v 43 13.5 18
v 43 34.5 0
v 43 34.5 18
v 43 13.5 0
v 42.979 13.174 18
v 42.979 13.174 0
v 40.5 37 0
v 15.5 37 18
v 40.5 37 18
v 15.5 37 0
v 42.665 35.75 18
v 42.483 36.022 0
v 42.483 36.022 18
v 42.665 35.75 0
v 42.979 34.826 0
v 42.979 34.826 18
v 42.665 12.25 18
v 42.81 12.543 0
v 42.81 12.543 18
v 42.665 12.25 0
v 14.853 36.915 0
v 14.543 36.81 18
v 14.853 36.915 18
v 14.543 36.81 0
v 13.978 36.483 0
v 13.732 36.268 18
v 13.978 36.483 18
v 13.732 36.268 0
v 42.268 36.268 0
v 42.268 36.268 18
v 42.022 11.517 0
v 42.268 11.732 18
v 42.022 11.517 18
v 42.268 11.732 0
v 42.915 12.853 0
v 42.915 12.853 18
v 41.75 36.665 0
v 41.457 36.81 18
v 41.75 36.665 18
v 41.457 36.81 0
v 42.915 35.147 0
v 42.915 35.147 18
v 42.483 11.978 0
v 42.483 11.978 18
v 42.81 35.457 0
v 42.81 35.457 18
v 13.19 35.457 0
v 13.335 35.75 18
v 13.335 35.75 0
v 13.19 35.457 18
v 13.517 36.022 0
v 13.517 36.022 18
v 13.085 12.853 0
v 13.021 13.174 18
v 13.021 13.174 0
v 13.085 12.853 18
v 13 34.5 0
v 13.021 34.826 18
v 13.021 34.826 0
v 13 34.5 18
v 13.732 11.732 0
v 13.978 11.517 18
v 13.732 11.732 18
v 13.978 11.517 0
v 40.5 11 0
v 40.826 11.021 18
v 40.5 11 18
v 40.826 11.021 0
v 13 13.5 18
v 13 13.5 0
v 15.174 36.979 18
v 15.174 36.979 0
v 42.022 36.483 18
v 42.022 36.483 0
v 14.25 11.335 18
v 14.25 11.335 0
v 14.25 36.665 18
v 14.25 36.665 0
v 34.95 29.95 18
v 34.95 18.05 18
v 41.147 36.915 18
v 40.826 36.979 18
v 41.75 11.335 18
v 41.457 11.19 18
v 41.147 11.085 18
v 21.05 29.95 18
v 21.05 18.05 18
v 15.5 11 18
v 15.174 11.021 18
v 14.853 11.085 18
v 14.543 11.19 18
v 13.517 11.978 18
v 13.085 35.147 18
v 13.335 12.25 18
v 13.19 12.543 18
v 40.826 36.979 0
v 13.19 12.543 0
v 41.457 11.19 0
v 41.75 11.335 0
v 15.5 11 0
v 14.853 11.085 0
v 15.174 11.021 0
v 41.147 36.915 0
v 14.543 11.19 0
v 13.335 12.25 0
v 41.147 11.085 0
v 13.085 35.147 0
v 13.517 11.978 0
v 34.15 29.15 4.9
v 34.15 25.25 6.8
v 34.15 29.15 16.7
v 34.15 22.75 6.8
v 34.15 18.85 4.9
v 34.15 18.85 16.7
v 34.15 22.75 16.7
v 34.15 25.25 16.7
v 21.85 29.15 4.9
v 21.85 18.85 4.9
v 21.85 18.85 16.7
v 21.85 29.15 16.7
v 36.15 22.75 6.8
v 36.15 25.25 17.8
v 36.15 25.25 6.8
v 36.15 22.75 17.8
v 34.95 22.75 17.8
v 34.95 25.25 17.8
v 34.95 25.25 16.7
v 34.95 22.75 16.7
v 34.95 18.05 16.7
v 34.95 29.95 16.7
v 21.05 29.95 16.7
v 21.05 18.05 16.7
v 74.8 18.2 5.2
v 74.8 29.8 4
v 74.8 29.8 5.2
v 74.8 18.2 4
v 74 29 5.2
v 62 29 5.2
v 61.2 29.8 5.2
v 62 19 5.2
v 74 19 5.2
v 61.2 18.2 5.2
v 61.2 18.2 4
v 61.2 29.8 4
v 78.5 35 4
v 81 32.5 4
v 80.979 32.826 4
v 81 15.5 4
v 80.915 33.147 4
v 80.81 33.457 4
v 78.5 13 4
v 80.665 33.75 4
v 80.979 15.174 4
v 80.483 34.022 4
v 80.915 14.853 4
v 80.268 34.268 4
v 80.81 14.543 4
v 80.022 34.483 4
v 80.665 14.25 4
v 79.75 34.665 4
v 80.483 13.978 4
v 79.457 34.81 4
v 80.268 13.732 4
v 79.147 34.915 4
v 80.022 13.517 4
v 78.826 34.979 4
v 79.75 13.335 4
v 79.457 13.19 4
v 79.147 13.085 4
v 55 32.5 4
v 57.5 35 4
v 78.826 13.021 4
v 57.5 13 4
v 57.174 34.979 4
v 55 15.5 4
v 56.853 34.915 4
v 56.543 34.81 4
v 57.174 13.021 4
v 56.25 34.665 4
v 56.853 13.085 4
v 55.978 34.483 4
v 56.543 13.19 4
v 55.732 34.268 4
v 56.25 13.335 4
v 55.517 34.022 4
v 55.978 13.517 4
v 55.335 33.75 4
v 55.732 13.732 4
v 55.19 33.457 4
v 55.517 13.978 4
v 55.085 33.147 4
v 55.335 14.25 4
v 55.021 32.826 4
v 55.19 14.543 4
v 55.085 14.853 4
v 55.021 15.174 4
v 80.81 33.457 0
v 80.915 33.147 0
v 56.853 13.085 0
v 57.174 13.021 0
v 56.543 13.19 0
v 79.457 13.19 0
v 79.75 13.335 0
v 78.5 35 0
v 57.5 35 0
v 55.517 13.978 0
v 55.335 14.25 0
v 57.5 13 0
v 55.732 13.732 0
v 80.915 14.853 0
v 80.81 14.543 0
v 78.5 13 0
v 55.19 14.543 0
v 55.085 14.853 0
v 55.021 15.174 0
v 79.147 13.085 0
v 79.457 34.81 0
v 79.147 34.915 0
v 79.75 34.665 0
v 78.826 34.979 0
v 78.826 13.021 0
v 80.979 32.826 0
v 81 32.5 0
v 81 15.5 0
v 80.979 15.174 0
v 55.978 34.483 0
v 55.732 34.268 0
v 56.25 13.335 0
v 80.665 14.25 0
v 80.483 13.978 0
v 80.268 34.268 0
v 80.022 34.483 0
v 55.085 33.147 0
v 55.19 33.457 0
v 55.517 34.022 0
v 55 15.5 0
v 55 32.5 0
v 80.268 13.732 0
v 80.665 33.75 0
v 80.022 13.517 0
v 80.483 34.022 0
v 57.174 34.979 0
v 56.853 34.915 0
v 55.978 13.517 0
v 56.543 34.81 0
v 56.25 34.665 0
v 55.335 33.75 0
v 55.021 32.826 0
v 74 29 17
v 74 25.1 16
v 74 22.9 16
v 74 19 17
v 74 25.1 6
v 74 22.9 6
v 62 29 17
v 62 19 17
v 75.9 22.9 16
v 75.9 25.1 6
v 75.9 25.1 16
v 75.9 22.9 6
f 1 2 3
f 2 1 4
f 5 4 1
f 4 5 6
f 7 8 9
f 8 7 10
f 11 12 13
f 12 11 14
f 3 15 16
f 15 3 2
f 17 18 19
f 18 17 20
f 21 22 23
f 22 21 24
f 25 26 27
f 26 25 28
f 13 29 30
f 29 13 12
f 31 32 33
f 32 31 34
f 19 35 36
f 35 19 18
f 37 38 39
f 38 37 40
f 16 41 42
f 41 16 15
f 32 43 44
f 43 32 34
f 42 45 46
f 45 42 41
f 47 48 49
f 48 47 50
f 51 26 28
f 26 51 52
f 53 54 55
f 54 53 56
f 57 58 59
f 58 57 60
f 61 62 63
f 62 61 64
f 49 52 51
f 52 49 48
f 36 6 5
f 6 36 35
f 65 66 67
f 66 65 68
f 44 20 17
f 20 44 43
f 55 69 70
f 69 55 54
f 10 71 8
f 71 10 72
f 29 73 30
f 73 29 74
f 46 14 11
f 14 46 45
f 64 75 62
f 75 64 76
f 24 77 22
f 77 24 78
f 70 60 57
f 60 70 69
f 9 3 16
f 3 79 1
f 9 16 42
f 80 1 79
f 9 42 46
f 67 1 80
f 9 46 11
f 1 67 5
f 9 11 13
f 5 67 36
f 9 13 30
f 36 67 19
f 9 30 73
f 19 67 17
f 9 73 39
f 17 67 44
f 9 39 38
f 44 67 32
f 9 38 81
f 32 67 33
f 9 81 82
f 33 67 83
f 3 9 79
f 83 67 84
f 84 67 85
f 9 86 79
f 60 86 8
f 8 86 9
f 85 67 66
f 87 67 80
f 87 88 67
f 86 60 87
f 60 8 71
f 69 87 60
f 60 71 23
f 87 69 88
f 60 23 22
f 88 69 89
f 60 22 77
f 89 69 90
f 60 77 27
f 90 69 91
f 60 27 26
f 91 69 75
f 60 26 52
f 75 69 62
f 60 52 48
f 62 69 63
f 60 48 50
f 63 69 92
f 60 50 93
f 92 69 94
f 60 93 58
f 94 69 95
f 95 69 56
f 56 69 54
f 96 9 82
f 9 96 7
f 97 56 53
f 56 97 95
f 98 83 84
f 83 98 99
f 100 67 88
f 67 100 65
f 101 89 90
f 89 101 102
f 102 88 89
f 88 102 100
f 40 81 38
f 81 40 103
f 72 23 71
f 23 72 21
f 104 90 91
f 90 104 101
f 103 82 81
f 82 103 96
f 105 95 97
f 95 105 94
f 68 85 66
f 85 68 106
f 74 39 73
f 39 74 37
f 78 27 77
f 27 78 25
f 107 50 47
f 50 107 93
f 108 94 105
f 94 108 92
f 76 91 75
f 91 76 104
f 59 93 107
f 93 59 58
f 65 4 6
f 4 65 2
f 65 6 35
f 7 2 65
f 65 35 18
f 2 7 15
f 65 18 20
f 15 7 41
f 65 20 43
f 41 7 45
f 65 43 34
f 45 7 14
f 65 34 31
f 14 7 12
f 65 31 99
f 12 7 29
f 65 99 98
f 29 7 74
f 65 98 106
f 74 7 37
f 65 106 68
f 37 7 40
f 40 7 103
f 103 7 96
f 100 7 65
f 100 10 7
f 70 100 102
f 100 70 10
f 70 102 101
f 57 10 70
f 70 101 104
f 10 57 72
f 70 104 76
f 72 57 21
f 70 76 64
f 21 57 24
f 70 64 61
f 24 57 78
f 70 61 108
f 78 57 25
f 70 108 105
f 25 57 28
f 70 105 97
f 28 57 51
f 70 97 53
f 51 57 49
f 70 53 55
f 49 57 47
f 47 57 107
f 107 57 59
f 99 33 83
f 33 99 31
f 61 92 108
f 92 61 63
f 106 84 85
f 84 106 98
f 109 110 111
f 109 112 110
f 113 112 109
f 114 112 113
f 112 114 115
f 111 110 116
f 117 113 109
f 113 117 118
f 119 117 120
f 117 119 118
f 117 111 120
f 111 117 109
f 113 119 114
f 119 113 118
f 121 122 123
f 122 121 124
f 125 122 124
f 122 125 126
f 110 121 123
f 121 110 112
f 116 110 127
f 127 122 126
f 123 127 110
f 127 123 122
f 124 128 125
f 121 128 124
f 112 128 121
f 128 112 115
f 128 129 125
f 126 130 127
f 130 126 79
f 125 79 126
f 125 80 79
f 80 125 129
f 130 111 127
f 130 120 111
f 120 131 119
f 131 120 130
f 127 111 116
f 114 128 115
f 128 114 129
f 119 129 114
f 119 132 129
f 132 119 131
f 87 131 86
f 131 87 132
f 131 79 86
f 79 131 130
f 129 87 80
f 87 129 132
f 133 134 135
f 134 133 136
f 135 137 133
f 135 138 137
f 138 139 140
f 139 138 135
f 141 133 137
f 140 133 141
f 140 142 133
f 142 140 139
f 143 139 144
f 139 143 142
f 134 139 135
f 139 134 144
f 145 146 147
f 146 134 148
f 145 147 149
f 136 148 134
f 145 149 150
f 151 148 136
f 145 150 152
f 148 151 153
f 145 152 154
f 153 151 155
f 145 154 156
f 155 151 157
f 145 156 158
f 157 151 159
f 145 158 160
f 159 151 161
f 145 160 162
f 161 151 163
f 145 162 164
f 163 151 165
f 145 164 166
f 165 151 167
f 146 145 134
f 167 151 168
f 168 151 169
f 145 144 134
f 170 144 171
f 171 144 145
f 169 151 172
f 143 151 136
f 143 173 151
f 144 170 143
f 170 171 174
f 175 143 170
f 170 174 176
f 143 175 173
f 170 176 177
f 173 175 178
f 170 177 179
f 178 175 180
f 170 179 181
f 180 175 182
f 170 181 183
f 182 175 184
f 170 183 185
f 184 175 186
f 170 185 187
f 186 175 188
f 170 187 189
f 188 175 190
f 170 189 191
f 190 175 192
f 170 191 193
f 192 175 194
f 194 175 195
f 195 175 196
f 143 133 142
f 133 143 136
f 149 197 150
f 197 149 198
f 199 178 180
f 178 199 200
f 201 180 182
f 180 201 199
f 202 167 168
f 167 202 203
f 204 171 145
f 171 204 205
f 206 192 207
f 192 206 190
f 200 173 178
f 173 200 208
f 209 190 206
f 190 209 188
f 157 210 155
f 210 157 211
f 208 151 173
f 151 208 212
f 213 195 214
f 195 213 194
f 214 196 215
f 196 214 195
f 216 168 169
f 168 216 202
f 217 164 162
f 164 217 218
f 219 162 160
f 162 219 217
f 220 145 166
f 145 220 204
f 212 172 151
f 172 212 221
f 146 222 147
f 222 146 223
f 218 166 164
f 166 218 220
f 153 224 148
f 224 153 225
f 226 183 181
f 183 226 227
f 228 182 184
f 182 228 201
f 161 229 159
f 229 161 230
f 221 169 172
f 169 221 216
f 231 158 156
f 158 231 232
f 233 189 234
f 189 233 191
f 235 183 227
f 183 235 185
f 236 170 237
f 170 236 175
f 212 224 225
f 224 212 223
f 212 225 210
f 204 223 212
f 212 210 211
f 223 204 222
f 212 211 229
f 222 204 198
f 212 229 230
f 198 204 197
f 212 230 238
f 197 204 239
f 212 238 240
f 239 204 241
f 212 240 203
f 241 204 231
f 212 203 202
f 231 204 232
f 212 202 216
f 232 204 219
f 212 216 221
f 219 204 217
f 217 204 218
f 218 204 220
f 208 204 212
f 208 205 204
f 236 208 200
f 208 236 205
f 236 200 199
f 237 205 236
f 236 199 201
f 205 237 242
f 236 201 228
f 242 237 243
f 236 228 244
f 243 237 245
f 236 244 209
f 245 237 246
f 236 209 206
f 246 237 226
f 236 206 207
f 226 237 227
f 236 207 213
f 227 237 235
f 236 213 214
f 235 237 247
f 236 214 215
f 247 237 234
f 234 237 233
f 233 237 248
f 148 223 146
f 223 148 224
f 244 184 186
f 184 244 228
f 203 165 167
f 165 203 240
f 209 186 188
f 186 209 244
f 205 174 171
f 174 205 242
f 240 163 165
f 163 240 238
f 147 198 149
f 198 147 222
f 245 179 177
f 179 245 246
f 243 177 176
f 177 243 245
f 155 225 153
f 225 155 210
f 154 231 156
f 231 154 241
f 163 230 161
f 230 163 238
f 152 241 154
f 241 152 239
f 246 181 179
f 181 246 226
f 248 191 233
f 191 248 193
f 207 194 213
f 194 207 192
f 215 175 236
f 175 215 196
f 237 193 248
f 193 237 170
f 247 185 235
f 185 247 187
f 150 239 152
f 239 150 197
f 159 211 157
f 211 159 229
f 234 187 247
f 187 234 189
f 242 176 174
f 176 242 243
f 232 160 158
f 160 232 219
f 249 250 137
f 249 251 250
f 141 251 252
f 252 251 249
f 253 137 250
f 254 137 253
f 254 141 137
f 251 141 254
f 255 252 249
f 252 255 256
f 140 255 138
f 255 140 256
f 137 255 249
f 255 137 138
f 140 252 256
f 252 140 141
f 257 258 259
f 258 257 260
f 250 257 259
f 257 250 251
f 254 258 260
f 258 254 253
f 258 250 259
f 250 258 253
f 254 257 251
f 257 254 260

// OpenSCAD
/*
Sample 041: Verdrehsichere Schlüssel-Steckverbindung — 0,15 mm
Generated from the FDM Mechanical Sample Library.
Units: millimetres.

Override examples:
  openscad -o custom.stl -D 'view="plate"' -D 'render_fn=64' model.scad
  openscad -o preview.png -D 'view="assembly"' model.scad
*/
use <../../../library/fdm_mechanisms.scad>

render_fn = is_undef(render_fn) ? 48 : render_fn;
view = is_undef(view) ? "plate" : view;
$fn = render_fn;

sample_keyed_plug_socket(
    view=view,
    clearance=0.15
);
